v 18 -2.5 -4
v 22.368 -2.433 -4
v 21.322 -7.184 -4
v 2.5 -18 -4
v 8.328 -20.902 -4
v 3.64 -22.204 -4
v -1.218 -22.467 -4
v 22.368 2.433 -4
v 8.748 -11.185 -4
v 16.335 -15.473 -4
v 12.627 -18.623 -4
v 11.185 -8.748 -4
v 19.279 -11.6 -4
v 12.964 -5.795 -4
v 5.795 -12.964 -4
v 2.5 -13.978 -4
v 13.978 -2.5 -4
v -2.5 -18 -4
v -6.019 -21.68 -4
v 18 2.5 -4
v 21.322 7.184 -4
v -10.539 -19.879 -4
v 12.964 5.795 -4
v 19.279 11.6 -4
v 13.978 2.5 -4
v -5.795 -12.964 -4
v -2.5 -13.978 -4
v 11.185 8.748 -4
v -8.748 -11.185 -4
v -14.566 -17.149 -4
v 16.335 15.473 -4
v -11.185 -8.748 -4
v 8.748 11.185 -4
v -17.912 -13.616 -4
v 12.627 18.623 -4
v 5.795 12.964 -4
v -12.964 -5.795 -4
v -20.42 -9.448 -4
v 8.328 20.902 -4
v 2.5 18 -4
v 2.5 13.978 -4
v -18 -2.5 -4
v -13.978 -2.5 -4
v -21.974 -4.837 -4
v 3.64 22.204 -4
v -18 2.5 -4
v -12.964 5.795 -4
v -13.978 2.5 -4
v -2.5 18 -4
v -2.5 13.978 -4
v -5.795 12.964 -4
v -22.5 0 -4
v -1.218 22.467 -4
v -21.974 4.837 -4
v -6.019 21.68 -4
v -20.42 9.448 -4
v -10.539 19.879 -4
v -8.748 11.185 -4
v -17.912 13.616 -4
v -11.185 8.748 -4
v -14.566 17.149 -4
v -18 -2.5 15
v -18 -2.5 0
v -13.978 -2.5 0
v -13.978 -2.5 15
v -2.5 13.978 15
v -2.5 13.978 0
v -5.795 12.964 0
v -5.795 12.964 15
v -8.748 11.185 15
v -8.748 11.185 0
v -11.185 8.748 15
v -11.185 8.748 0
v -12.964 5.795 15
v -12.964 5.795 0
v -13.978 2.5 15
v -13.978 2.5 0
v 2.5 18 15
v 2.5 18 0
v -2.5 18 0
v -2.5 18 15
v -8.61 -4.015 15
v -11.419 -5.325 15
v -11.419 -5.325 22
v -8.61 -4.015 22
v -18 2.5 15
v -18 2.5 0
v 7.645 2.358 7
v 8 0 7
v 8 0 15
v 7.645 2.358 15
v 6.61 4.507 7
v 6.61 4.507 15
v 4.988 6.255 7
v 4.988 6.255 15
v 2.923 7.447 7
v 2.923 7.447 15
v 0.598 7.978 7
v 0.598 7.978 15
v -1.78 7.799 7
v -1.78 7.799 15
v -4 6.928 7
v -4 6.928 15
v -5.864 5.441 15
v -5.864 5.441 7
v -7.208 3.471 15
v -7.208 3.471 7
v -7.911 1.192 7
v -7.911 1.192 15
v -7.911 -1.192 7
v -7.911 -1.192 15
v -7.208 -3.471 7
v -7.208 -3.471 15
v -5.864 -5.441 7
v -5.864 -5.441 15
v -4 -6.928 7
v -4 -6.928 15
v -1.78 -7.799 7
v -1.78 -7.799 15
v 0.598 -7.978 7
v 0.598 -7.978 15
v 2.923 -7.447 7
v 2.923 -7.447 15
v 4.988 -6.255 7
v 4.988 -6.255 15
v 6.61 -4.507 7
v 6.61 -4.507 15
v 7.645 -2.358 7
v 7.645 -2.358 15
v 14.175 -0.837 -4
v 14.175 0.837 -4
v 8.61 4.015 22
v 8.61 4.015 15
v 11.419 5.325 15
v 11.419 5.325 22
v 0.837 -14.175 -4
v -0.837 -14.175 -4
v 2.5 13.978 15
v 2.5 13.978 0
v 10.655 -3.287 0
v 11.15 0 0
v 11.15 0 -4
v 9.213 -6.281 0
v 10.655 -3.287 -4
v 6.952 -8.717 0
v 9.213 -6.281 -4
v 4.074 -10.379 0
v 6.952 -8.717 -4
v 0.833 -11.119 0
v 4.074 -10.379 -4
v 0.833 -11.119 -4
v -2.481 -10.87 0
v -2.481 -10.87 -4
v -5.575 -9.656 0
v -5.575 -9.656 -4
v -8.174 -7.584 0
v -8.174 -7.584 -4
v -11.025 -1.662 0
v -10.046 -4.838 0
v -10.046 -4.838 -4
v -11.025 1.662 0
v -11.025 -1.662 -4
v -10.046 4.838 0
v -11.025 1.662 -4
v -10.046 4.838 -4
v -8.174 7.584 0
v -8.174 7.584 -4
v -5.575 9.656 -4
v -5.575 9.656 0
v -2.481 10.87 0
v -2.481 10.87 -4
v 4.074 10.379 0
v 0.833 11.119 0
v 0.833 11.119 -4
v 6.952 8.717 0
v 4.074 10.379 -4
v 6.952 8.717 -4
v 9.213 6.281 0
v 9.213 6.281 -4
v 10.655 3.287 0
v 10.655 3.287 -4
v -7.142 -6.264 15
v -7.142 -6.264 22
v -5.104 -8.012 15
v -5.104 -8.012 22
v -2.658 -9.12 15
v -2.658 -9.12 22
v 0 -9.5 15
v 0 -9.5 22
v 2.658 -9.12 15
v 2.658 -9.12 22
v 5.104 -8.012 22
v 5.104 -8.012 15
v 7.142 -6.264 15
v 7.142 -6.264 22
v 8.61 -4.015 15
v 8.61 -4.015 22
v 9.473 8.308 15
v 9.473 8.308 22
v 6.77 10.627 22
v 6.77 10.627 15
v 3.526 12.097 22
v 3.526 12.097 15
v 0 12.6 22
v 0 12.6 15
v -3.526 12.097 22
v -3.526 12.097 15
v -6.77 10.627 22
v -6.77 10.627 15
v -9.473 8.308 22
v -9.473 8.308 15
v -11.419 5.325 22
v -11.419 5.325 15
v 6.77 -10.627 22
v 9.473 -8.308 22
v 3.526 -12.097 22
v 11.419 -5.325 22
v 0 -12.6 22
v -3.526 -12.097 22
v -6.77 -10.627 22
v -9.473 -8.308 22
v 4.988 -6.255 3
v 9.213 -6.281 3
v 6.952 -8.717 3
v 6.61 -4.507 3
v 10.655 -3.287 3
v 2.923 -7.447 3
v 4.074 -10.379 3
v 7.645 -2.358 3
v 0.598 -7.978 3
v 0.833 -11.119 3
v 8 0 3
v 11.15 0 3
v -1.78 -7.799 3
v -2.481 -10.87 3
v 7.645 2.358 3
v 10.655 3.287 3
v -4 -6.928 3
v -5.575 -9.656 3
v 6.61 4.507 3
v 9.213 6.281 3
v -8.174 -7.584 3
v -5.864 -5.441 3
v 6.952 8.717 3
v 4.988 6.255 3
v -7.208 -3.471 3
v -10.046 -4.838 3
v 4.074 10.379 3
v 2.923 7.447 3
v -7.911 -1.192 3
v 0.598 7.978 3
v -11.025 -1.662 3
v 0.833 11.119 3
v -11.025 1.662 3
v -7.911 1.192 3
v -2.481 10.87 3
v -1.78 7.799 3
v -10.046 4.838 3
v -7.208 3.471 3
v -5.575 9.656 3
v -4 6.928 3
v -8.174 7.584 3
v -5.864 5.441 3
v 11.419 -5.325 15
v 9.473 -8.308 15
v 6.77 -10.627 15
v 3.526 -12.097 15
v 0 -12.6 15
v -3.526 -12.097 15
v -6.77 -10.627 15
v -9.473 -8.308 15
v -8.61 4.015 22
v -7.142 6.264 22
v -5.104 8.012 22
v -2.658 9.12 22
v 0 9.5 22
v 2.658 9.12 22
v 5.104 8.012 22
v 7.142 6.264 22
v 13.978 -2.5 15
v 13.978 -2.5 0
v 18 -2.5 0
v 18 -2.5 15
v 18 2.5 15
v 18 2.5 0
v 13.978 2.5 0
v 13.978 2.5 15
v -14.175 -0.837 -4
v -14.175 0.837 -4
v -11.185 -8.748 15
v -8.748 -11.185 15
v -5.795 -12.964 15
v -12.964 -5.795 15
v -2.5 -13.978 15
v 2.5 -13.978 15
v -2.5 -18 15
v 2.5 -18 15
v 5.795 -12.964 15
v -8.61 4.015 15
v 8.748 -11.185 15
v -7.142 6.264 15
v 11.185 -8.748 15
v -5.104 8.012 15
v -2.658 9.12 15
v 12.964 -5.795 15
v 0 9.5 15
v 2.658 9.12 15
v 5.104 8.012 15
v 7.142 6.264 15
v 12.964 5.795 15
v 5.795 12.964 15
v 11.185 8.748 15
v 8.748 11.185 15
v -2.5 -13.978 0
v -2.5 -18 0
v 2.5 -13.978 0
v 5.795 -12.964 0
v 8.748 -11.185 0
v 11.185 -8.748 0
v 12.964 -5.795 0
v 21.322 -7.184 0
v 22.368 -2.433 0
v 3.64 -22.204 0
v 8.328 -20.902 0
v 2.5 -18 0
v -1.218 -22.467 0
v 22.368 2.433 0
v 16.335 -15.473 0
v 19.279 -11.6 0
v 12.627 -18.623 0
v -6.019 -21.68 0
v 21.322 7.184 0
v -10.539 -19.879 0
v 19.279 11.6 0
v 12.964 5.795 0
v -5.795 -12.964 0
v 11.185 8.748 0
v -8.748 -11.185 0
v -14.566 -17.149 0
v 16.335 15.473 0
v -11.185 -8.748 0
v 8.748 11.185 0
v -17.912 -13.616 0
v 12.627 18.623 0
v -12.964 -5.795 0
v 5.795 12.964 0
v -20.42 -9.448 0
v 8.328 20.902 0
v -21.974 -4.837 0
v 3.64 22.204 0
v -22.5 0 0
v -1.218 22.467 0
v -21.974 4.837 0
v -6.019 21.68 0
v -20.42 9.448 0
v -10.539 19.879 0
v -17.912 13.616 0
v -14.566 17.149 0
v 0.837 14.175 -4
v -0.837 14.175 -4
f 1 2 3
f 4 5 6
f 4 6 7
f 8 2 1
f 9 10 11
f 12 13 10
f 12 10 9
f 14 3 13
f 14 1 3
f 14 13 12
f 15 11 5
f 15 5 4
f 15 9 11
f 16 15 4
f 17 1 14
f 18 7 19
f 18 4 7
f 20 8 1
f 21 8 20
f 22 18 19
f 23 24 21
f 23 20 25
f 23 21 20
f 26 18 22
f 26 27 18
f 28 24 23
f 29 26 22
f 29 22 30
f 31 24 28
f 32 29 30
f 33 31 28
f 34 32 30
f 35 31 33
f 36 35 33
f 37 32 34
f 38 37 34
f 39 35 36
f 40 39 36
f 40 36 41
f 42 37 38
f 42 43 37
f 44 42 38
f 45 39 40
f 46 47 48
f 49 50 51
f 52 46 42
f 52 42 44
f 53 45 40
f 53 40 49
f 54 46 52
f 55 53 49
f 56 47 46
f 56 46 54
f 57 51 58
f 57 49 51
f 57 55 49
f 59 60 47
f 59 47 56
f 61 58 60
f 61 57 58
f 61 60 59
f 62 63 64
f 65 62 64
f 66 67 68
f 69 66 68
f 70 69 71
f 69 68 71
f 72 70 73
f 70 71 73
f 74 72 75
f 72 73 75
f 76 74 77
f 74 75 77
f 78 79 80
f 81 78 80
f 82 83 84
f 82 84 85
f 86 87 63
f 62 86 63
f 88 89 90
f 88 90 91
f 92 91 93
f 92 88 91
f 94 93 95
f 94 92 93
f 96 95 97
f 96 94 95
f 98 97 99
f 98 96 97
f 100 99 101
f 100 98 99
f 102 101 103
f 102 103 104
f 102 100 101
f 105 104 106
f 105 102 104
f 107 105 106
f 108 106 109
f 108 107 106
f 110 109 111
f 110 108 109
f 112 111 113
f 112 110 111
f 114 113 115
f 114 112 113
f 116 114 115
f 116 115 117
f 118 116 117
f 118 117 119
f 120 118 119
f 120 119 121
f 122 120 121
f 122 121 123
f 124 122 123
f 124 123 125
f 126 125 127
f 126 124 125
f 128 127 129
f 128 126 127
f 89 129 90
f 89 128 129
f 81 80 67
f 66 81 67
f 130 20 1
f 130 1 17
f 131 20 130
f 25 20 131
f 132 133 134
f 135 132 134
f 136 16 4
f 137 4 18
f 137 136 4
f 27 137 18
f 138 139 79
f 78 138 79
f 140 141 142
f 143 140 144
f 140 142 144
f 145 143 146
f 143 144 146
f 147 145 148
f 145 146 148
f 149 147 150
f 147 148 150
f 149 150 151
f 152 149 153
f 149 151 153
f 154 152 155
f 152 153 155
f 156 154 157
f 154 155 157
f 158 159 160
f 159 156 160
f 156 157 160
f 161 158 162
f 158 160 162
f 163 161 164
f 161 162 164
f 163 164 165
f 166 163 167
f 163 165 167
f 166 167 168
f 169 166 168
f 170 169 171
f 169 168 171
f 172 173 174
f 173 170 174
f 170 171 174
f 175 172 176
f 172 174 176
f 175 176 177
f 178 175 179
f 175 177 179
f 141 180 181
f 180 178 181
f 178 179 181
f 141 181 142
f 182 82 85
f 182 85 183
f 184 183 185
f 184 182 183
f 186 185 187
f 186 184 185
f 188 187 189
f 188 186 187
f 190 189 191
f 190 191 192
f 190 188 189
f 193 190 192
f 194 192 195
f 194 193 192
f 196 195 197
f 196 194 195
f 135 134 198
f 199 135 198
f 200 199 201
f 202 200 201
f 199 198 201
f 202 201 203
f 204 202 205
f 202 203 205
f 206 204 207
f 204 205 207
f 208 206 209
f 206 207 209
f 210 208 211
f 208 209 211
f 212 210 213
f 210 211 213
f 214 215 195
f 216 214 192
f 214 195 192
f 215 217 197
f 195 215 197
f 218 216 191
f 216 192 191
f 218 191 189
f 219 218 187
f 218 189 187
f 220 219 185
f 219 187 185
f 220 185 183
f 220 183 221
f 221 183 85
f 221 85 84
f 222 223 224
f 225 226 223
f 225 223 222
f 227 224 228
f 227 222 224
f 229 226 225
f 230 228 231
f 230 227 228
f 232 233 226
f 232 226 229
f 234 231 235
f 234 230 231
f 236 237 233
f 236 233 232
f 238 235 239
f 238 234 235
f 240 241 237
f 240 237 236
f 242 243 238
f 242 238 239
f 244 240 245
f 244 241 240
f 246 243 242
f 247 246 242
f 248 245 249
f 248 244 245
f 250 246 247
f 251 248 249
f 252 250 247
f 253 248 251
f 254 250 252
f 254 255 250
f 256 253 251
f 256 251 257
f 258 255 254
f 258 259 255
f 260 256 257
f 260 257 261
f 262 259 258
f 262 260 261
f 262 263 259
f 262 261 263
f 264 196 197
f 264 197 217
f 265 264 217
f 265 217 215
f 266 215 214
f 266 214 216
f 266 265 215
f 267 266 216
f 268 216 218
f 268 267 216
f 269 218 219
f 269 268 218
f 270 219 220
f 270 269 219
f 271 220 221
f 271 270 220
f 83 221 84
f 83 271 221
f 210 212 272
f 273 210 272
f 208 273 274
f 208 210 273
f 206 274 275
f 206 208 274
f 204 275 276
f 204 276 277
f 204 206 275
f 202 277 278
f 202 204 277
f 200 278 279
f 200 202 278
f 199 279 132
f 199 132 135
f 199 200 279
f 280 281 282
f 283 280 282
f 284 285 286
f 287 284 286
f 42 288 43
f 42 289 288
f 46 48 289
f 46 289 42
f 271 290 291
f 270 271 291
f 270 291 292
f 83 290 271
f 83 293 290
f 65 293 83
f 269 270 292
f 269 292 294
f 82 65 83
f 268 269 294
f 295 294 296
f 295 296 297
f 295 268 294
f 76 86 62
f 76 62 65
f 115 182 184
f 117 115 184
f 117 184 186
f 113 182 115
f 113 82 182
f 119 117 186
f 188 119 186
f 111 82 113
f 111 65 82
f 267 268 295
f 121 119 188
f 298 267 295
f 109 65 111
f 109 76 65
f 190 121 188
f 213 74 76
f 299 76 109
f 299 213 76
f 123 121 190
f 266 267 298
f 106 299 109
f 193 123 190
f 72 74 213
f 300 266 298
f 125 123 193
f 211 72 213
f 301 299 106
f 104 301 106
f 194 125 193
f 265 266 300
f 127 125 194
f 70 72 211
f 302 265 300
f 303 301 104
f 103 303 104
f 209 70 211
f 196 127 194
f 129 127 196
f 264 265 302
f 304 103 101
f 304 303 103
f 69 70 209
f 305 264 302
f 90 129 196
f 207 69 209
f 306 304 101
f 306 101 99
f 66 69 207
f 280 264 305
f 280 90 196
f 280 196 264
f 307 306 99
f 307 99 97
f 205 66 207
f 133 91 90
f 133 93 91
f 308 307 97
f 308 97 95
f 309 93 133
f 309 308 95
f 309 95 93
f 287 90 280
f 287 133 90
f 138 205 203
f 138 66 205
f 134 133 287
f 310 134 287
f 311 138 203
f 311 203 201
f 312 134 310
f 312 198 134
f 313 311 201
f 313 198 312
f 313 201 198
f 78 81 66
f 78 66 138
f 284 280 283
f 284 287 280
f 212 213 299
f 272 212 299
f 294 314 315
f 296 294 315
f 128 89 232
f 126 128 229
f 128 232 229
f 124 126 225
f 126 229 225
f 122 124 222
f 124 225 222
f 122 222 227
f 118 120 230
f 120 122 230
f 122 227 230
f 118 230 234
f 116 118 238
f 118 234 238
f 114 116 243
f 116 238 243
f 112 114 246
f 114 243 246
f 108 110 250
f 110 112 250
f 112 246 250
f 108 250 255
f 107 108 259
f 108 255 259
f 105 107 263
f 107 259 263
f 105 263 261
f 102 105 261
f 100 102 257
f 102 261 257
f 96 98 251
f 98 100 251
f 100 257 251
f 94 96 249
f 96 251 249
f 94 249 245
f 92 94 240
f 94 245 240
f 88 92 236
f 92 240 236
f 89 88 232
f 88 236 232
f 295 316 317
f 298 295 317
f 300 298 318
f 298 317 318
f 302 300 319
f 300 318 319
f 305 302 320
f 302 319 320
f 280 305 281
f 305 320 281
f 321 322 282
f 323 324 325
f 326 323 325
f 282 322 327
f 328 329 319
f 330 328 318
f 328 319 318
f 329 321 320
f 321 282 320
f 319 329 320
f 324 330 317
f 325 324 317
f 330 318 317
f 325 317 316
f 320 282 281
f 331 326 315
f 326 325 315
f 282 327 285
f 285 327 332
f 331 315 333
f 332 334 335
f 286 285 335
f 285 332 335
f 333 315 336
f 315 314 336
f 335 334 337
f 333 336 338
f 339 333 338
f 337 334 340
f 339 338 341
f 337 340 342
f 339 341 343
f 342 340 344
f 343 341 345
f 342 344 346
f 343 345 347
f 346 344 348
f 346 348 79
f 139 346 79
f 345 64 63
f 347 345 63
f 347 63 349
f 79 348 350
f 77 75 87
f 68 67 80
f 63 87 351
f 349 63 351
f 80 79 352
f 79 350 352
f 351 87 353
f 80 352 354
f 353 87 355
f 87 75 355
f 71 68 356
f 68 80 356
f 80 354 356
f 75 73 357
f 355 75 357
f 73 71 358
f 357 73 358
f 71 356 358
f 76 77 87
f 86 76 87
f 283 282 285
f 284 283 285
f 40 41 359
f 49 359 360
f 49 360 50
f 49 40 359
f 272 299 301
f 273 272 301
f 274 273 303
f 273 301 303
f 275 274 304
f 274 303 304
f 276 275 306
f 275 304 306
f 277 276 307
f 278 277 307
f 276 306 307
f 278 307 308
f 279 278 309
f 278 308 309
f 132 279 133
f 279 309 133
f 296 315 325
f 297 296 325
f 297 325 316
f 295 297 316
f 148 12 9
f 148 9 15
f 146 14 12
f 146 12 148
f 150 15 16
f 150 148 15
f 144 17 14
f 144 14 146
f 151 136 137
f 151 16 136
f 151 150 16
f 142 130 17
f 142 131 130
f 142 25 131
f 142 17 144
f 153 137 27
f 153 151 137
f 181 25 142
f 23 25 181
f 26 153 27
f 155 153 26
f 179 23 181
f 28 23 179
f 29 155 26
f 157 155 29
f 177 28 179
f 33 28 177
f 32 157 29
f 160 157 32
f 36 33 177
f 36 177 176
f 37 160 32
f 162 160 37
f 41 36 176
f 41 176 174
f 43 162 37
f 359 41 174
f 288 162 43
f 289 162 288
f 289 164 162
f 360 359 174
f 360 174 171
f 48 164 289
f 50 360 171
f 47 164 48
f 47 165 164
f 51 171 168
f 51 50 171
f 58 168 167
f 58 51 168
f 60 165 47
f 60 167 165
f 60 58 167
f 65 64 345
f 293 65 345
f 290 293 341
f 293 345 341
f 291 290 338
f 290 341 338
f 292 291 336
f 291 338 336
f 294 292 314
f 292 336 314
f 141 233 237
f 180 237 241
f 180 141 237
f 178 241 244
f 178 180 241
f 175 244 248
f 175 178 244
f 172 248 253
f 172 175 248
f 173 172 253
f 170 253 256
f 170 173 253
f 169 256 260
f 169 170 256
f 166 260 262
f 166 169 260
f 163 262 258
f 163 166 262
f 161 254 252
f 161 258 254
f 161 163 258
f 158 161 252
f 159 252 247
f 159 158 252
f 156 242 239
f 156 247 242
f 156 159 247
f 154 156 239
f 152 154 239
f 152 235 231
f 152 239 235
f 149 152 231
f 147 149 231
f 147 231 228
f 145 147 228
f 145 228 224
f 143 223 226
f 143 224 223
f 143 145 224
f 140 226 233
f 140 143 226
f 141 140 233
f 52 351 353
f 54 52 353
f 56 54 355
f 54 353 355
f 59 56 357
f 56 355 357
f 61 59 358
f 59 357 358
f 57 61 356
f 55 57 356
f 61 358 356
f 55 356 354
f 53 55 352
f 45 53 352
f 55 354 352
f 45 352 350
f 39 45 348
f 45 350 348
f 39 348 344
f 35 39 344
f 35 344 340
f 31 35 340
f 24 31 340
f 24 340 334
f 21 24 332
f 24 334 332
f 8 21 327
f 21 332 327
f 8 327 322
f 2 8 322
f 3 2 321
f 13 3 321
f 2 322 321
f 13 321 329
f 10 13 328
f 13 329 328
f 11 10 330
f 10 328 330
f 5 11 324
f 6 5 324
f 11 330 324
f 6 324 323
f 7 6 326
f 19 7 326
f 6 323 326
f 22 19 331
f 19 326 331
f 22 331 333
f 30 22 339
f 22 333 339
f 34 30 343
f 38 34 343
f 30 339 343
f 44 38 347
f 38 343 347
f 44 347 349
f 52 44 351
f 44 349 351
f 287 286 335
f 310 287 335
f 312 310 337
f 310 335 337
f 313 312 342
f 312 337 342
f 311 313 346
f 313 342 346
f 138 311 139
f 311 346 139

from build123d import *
from build123d.topology import SkipClean

# Parameters (mm, degrees)
ESBO_O1_R                = 11.15
RESSALTO_EXTRUS_O1_DEPTH = 15
ESBO_O2_R                = 22.5
RESSALTO_EXTRUS_O2_DEPTH = 4
RESSALTO_EXTRUS_O6_START = -8
ESBO_O5_R                = 11.15
ESBO_O5_R_2              = 8
RESSALTO_EXTRUS_O6_DEPTH = 8
RESSALTO_EXTRUS_O7_START = 4
ESBO_O7_R                = 14.2
ESBO_O7_R_2              = 11.15
RESSALTO_EXTRUS_O7_DEPTH = 4
RESSALTO_EXTRUS_O8_START = 4
ESBO_O8_R                = 11.15
ESBO_O8_R_2              = 8
RESSALTO_EXTRUS_O8_DEPTH = 4
RESSALTO_EXTRUS_O9_DEPTH = 7


with BuildPart() as part:
    # Esboço1 → Ressalto-extrusão1 (new body)
    with BuildSketch(Plane.XY):
        with BuildLine():
            Line((-2.5, 18), (-2.5, 13.978197309))
            ThreePointArc((-2.5, 13.978197309), (-10.040916293, 10.040916293), (-13.978197309, 2.5))
            Line((-13.978197309, 2.5), (-18, 2.5))
            Line((-18, 2.5), (-18, -2.5))
            Line((-18, -2.5), (-13.978197309, -2.5))
            ThreePointArc((-13.978197309, -2.5), (-10.040916293, -10.040916293), (-2.5, -13.978197309))
            Line((-2.5, -13.978197309), (-2.5, -18))
            Line((-2.5, -18), (2.5, -18))
            Line((2.5, -18), (2.5, -13.978197309))
            ThreePointArc((2.5, -13.978197309), (10.040916293, -10.040916293), (13.978197309, -2.5))
            Line((13.978197309, -2.5), (18, -2.5))
            Line((18, -2.5), (18, 2.5))
            Line((18, 2.5), (13.978197309, 2.5))
            ThreePointArc((13.978197309, 2.5), (10.040916293, 10.040916293), (2.5, 13.978197309))
            Line((2.5, 13.978197309), (2.5, 18))
            Line((2.5, 18), (-2.5, 18))
        make_face()
        Circle(ESBO_O1_R, mode=Mode.SUBTRACT)
    extrude(amount=RESSALTO_EXTRUS_O1_DEPTH)

    # Esboço5 → Ressalto-extrusão6 (add)
    with BuildSketch(Plane.XY.offset(15).offset(RESSALTO_EXTRUS_O6_START)):
        Circle(ESBO_O5_R)
        Circle(ESBO_O5_R_2, mode=Mode.SUBTRACT)
    extrude(amount=RESSALTO_EXTRUS_O6_DEPTH)



with BuildPart() as body_2:
    # Esboço2 → Ressalto-extrusão2 (new body)
    # profile 1 of 5: a face of its own
    with SkipClean():  # the faces are left unmerged after this step: merging them gives an invalid solid
        with BuildSketch(Plane(origin=(0, 0, 0), x_dir=(-1, 0, 0), z_dir=(0, 0, -1))):
            Circle(ESBO_O2_R)
            with BuildLine():
                Line((2.5, 13.978197309), (2.5, 18))
                Line((2.5, 18), (-2.5, 18))
                Line((-2.5, 18), (-2.5, 13.978197309))
                ThreePointArc((-2.5, 13.978197309), (-10.040916293, 10.040916293), (-13.978197309, 2.5))
                Line((-13.978197309, 2.5), (-18, 2.5))
                Line((-18, 2.5), (-18, -2.5))
                Line((-18, -2.5), (-13.978197309, -2.5))
                ThreePointArc((-13.978197309, -2.5), (-10.040916293, -10.040916293), (-2.5, -13.978197309))
                Line((-2.5, -13.978197309), (-2.5, -18))
                Line((-2.5, -18), (2.5, -18))
                Line((2.5, -18), (2.5, -13.978197309))
                ThreePointArc((2.5, -13.978197309), (10.040916293, -10.040916293), (13.978197309, -2.5))
                Line((13.978197309, -2.5), (18, -2.5))
                Line((18, -2.5), (18, 2.5))
                Line((18, 2.5), (13.978197309, 2.5))
                ThreePointArc((13.978197309, 2.5), (10.040916293, 10.040916293), (2.5, 13.978197309))
            make_face(mode=Mode.SUBTRACT)
        # profile 2 of 5: a face of its own
        with BuildSketch(Plane(origin=(0, 0, 0), x_dir=(-1, 0, 0), z_dir=(0, 0, -1))):
            with BuildLine():
                Line((2.5, -18), (2.5, -13.978197309))
                ThreePointArc((2.5, -13.978197309), (0, -14.2), (-2.5, -13.978197309))
                Line((-2.5, -13.978197309), (-2.5, -18))
                Line((-2.5, -18), (2.5, -18))
            make_face()
        # profile 3 of 5: a face of its own
        with BuildSketch(Plane(origin=(0, 0, 0), x_dir=(-1, 0, 0), z_dir=(0, 0, -1))):
            with BuildLine():
                ThreePointArc((-13.978197309, -2.5), (-14.2, 0), (-13.978197309, 2.5))
                Line((-13.978197309, 2.5), (-18, 2.5))
                Line((-18, 2.5), (-18, -2.5))
                Line((-18, -2.5), (-13.978197309, -2.5))
            make_face()
        # profile 4 of 5: a face of its own
        with BuildSketch(Plane(origin=(0, 0, 0), x_dir=(-1, 0, 0), z_dir=(0, 0, -1))):
            with BuildLine():
                ThreePointArc((-2.5, 13.978197309), (0, 14.2), (2.5, 13.978197309))
                Line((2.5, 13.978197309), (2.5, 18))
                Line((2.5, 18), (-2.5, 18))
                Line((-2.5, 18), (-2.5, 13.978197309))
            make_face()
        # profile 5 of 5: a face of its own
        with BuildSketch(Plane(origin=(0, 0, 0), x_dir=(-1, 0, 0), z_dir=(0, 0, -1))):
            with BuildLine():
                Line((18, 2.5), (13.978197309, 2.5))
                ThreePointArc((13.978197309, 2.5), (14.2, 0), (13.978197309, -2.5))
                Line((13.978197309, -2.5), (18, -2.5))
                Line((18, -2.5), (18, 2.5))
            make_face()
        extrude(amount=RESSALTO_EXTRUS_O2_DEPTH)


with BuildPart() as part_1:
    with SkipClean():  # the faces are left unmerged after this step: merging them gives an invalid solid
        add(part.part)

        add(body_2.part)  # Ressalto-extrusão7 merges body 2
        # Esboço7 → Ressalto-extrusão7 (add)
        with BuildSketch(Plane(origin=(0, 0, 0), x_dir=(-1, 0, 0), z_dir=(0, 0, -1)).offset(RESSALTO_EXTRUS_O7_START)):
            Circle(ESBO_O7_R)
            with Locations(Location((0, 0, 0), (0, 0, 180))):
                Circle(ESBO_O7_R_2, mode=Mode.SUBTRACT)
        extrude(amount=-RESSALTO_EXTRUS_O7_DEPTH)

    # Esboço8 → Ressalto-extrusão8 (add)
    with BuildSketch(Plane(origin=(0, 0, 7), x_dir=(-1, 0, 0), z_dir=(0, 0, -1)).offset(RESSALTO_EXTRUS_O8_START)):
        Circle(ESBO_O8_R)
        with Locations(Location((0, 0, 0), (0, 0, 180))):
            Circle(ESBO_O8_R_2, mode=Mode.SUBTRACT)
    extrude(amount=-RESSALTO_EXTRUS_O8_DEPTH)

    # Esboço9 → Ressalto-extrusão9 (add)
    with BuildSketch(Plane.XY.offset(15)):
        with BuildLine():
            Line((-11.419478117, 5.324990098), (-8.609923977, 4.014873487))
            ThreePointArc((-8.609923977, 4.014873487), (0, 9.5), (8.609923977, 4.014873487))
            Line((8.609923977, 4.014873487), (11.419478117, 5.324990098))
            ThreePointArc((11.419478117, 5.324990098), (0, 12.6), (-11.419478117, 5.324990098))
        make_face()
        with BuildLine():
            Line((-11.419478117, -5.324990098), (-8.609923977, -4.014873487))
            ThreePointArc((-8.609923977, -4.014873487), (0, -9.5), (8.609923977, -4.014873487))
            Line((8.609923977, -4.014873487), (11.419478117, -5.324990098))
            ThreePointArc((11.419478117, -5.324990098), (0, -12.6), (-11.419478117, -5.324990098))
        make_face()
    extrude(amount=RESSALTO_EXTRUS_O9_DEPTH)


solid = part_1.part
